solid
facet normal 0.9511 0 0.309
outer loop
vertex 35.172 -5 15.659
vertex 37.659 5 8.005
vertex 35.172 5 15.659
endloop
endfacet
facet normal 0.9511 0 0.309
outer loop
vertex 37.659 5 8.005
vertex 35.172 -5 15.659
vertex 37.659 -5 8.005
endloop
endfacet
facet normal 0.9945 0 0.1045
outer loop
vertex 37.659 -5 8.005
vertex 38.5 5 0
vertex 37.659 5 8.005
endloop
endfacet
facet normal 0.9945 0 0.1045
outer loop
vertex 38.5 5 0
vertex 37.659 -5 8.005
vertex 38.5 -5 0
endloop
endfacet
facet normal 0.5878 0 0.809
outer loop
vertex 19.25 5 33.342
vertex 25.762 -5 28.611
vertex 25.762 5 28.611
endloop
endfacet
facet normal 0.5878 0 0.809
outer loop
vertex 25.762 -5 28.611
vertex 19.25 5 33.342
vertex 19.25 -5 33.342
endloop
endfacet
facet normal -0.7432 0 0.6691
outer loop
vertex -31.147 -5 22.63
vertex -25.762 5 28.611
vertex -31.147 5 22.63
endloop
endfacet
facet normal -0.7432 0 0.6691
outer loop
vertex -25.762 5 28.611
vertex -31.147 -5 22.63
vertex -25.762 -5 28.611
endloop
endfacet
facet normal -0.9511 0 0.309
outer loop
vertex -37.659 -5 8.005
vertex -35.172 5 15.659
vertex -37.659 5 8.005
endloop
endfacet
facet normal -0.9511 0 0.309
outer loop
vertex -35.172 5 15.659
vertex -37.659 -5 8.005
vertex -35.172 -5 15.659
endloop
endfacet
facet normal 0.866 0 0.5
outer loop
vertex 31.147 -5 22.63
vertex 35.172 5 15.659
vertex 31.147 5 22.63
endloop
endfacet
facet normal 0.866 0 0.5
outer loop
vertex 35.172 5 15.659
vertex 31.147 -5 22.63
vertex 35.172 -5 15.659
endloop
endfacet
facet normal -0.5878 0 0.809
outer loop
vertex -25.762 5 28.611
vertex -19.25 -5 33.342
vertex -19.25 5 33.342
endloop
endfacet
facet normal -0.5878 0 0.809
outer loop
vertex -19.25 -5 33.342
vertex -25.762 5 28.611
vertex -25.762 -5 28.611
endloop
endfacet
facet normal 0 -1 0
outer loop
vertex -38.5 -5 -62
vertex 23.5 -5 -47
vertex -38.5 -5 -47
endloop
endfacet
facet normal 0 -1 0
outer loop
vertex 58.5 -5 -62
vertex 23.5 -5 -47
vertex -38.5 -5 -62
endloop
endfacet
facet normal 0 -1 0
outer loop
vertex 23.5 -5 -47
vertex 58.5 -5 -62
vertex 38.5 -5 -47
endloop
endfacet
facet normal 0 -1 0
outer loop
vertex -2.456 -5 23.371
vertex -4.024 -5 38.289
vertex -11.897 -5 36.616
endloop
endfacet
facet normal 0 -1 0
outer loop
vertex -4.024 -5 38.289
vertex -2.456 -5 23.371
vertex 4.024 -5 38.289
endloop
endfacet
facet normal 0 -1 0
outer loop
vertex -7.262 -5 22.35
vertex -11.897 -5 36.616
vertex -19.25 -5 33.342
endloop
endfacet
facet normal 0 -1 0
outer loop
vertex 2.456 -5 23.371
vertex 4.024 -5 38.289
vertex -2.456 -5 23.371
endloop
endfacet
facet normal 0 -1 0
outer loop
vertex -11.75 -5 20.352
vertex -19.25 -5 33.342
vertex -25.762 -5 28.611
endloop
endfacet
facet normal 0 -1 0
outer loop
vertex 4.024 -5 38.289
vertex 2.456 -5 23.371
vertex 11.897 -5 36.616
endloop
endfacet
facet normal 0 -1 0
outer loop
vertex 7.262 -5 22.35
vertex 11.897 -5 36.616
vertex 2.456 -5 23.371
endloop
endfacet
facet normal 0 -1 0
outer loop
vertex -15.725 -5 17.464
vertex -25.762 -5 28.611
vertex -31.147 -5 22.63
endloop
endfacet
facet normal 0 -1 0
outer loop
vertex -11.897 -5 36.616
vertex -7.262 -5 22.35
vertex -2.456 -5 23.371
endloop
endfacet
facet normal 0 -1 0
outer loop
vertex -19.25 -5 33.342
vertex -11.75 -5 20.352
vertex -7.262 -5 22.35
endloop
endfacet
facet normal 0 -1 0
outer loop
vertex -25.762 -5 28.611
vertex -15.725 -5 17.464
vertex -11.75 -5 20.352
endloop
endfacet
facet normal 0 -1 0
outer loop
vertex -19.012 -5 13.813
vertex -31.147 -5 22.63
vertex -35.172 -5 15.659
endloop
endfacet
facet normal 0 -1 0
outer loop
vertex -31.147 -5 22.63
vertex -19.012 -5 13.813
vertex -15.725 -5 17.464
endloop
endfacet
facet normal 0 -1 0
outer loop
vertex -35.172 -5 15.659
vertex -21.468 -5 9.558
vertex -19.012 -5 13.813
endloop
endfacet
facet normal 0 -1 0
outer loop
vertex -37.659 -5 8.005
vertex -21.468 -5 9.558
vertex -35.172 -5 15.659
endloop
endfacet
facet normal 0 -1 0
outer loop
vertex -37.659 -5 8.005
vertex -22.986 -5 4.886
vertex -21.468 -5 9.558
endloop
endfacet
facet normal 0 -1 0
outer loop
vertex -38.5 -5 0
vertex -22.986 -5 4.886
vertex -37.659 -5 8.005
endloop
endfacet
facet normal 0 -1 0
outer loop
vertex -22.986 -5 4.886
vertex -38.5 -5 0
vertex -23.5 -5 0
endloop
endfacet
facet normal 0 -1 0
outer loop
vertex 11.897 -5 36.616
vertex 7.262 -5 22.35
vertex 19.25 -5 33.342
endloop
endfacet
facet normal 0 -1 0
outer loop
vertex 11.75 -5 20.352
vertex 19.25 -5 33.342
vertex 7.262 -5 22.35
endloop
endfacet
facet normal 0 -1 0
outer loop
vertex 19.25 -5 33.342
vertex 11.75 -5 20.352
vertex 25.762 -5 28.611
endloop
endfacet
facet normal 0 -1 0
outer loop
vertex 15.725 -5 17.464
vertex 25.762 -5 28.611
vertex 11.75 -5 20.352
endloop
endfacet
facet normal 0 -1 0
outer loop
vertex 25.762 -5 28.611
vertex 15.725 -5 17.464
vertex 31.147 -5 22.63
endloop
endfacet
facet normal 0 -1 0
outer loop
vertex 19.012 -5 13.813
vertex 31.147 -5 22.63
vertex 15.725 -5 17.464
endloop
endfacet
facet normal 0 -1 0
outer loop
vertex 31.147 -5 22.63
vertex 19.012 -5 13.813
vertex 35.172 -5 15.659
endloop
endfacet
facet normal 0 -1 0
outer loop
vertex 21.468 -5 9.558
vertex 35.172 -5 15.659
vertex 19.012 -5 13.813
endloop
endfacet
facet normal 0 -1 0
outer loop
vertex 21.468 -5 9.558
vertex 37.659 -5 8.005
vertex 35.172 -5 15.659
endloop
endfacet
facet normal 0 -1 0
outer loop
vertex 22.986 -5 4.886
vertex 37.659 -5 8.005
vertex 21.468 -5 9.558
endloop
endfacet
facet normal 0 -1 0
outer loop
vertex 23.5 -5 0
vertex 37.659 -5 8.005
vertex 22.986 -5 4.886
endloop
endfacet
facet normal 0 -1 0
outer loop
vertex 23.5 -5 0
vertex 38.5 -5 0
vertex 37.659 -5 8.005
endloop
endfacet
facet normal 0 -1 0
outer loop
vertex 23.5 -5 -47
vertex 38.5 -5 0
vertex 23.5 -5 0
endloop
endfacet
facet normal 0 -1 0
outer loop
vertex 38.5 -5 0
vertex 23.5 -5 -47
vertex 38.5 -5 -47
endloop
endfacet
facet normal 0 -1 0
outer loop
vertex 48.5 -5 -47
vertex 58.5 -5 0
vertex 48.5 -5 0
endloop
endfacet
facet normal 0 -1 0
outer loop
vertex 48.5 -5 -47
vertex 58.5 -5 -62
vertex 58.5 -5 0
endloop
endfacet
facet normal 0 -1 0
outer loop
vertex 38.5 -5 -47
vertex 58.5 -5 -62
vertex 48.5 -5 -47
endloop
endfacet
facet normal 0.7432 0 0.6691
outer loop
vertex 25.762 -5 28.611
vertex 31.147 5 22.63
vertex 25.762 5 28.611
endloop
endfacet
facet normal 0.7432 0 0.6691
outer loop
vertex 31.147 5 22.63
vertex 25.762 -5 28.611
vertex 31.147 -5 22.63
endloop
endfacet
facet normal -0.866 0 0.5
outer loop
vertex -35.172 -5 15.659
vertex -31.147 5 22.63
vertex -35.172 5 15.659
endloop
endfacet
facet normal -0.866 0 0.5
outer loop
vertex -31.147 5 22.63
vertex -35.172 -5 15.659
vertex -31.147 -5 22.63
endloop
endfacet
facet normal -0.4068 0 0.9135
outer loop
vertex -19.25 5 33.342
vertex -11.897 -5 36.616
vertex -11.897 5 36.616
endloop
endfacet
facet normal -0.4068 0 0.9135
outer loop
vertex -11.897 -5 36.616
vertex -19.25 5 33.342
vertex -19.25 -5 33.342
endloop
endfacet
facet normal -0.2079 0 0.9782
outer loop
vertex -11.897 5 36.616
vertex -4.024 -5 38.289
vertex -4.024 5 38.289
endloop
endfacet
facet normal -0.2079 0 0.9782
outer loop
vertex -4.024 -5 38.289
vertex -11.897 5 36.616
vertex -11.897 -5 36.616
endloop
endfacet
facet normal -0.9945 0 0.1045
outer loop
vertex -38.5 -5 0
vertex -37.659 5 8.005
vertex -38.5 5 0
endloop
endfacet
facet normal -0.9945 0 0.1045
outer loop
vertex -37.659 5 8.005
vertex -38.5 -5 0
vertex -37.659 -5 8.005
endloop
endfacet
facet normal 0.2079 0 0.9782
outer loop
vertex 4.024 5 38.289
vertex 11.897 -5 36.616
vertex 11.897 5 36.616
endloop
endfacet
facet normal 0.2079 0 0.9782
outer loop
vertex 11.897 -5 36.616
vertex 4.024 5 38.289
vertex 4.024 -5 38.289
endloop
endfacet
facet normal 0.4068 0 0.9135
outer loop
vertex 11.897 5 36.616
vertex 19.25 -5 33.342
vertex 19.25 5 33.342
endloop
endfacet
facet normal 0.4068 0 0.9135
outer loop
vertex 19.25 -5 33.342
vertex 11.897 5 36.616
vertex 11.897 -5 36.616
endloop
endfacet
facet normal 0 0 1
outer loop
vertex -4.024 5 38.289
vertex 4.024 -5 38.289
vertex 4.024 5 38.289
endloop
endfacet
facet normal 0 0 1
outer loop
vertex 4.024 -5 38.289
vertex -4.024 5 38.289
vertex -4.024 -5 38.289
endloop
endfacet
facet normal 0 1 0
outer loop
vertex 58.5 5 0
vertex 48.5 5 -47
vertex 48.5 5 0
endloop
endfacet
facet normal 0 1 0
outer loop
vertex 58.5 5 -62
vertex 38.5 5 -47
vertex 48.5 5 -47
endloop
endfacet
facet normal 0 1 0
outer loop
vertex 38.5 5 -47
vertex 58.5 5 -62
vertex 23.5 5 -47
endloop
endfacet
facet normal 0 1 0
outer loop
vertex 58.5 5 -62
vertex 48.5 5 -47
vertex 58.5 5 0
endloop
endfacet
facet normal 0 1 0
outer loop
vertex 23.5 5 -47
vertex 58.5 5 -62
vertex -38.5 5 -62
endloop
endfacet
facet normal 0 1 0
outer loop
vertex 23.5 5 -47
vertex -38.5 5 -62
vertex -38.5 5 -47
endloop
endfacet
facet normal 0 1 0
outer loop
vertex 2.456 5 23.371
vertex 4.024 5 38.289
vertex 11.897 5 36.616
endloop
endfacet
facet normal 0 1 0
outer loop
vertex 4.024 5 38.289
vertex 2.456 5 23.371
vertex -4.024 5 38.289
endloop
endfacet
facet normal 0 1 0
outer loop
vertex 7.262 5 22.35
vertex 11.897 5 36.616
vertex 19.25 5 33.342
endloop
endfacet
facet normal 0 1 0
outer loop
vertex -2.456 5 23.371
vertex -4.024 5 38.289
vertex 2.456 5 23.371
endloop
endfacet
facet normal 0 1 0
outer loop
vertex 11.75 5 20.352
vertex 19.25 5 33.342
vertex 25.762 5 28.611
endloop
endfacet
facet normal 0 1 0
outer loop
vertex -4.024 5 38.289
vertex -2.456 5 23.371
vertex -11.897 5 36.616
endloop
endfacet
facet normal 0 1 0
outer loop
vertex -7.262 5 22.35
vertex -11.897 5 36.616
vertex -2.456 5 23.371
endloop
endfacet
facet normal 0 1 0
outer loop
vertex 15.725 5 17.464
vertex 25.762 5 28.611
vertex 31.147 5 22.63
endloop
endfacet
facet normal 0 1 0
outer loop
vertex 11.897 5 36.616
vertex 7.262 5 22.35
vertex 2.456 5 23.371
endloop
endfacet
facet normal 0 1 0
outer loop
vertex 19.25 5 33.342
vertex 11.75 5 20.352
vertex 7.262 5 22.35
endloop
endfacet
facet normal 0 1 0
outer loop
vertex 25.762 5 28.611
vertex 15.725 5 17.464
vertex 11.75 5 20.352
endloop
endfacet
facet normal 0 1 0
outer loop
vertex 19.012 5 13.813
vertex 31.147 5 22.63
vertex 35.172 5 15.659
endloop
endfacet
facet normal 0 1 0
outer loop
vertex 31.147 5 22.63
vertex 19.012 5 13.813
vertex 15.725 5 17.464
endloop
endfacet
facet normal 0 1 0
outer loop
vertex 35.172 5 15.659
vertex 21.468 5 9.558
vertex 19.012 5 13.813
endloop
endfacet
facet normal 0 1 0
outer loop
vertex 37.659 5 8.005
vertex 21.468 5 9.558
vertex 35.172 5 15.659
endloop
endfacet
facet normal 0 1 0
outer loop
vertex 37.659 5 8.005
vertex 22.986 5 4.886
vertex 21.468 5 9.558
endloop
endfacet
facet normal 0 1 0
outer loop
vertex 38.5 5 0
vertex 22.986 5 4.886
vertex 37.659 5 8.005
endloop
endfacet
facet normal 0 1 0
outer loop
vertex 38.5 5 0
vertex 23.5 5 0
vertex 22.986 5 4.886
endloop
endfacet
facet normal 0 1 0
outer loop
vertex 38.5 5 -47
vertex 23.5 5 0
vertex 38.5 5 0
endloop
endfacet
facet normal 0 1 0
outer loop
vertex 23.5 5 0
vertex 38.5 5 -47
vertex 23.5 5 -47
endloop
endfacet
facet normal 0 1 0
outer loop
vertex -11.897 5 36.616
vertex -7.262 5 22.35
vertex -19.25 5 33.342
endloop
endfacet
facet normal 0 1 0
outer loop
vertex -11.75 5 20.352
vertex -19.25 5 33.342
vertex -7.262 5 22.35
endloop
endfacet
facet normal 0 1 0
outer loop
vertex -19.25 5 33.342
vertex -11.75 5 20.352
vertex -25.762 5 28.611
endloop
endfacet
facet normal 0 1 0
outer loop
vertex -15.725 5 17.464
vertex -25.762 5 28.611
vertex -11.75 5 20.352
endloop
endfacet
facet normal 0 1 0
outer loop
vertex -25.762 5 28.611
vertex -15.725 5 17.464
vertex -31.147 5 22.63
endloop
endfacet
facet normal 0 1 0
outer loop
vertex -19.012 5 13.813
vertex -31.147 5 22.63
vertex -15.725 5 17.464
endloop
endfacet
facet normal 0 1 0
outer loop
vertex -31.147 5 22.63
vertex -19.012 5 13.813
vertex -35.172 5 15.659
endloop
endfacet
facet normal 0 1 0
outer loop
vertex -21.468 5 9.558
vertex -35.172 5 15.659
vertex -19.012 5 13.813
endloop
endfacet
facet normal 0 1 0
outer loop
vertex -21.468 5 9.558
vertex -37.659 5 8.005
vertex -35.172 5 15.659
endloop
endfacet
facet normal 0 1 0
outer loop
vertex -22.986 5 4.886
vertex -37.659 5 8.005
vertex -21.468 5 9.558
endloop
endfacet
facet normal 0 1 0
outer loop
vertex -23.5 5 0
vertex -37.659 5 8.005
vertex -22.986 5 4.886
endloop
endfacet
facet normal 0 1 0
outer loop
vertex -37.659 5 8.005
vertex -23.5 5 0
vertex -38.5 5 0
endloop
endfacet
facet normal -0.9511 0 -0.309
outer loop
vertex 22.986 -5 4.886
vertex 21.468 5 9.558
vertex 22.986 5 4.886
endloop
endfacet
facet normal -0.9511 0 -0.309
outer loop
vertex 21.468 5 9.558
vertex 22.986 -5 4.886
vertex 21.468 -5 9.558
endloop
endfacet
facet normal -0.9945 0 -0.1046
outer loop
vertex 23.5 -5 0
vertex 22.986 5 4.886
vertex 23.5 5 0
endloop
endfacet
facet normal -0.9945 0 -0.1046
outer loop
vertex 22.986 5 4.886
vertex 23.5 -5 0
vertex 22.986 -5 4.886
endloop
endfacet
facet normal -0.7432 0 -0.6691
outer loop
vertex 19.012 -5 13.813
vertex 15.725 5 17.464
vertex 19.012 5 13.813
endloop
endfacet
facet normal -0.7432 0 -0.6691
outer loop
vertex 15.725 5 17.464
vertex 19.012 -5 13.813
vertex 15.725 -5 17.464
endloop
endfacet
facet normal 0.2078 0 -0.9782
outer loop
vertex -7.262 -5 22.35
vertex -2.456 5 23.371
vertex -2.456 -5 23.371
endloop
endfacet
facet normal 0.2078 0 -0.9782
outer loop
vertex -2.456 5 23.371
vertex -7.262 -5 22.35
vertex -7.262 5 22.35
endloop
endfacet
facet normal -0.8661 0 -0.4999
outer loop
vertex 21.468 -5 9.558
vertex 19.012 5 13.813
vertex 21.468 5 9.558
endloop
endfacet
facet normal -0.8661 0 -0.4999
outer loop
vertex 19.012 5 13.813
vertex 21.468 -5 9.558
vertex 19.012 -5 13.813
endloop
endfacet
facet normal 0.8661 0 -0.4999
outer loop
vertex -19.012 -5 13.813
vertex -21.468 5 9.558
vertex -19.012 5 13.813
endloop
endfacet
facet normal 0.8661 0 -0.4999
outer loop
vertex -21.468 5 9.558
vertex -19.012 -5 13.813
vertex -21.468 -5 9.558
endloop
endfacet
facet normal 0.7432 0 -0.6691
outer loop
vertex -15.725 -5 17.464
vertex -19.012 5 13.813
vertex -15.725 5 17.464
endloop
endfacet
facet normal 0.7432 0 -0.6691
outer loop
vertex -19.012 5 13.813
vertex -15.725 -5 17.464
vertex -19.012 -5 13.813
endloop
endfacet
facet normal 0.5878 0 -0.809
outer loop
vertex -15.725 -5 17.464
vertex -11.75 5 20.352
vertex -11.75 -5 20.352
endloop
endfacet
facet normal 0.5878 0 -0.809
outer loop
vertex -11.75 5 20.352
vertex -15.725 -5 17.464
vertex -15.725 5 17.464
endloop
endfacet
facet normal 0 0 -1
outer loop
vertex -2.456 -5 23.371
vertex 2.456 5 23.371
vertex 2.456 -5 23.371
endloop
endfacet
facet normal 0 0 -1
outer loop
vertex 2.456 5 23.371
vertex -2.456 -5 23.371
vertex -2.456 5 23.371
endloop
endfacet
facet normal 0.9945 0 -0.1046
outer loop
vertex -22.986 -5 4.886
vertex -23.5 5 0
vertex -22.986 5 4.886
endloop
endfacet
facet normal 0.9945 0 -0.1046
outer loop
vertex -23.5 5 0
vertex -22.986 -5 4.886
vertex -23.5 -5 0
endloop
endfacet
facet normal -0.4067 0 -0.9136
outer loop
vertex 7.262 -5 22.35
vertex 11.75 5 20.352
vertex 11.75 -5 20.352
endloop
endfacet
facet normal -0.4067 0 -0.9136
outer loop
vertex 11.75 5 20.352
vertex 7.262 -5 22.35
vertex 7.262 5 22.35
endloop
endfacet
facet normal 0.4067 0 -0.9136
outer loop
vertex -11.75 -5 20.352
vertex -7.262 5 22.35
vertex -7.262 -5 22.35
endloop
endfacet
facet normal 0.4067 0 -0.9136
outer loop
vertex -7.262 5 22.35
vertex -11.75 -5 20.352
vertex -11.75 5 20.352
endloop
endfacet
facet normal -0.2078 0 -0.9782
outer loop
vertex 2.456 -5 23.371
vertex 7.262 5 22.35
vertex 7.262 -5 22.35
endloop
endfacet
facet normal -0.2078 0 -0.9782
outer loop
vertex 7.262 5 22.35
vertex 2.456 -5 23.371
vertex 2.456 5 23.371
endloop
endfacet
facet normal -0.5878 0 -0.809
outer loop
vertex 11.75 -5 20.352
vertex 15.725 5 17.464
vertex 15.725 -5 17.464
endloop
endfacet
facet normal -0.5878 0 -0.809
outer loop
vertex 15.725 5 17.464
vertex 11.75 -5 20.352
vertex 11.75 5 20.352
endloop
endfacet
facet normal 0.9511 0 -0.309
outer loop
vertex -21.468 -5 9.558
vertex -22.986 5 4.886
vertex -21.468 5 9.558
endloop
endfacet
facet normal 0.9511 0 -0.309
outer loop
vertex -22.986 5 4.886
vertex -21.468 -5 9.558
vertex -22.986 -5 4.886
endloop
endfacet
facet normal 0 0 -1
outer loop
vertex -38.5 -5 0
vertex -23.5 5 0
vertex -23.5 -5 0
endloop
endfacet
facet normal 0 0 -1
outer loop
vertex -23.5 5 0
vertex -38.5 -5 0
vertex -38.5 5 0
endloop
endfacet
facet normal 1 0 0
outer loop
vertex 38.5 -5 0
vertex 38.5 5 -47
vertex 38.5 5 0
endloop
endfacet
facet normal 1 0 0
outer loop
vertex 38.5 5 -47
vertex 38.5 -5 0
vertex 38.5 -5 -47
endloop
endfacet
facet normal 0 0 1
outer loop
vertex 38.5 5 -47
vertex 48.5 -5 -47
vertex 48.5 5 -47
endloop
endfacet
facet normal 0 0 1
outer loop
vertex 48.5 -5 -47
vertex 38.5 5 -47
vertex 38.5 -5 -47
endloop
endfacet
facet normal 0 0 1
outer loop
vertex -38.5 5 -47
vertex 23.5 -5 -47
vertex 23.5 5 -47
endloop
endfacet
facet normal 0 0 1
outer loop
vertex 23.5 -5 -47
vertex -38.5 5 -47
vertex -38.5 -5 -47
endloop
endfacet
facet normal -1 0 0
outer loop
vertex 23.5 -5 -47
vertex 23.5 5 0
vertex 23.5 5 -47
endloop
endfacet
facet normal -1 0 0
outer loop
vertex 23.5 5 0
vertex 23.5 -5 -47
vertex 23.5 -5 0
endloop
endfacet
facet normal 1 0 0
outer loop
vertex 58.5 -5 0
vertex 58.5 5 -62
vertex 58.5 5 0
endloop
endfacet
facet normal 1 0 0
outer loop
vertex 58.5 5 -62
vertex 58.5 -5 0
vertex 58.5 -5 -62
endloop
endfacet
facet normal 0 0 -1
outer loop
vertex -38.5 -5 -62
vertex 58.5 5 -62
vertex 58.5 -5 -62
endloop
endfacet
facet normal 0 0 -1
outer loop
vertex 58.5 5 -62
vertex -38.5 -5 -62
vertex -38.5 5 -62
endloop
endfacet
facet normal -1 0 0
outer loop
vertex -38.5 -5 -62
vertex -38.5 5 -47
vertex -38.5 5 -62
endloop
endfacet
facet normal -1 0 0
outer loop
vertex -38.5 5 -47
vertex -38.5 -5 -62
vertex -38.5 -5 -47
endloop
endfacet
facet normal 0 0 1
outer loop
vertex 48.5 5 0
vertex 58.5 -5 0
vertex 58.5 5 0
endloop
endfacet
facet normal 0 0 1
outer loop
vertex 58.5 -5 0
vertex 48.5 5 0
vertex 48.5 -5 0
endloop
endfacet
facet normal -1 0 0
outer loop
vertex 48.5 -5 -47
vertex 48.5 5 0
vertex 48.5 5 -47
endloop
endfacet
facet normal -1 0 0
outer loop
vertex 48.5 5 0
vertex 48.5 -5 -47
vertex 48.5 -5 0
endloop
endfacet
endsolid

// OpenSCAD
diam = 47; // pipe diameter
radius = diam/2;
claspwidth = 10; //how wide the clasp is
claspthickness = 15; //how thick the clasp is
claspouterdiam = diam + claspthickness * 2;

bracerz = 15;
bracerwidth = 20;


difference() {
    rotate([90,0,0]) cylinder(h = claspwidth, d = claspouterdiam, center = true);
    rotate([90,0,0]) cylinder(h = claspwidth + 1, d = diam, center = true);
    translate([0,0,(0- claspouterdiam/4)]) 
        cube([claspouterdiam, claspwidth + 1,claspouterdiam/2], center = true);
}
//vertical bar
translate([claspthickness/2 + radius, 0, 0 - diam/2]) 
    cube([claspthickness, claspwidth, diam], center = true);
//horizontal brace
translate([0-(radius + claspthickness), -claspwidth/2, 0 - (bracerz + diam)])
    cube([claspouterdiam + bracerwidth, claspwidth, bracerz], center = false);
//vertical hook bar
translate([radius + claspthickness + bracerwidth - claspwidth, -claspwidth/2, -diam])
    cube([claspwidth, claspwidth, diam], center = false);
